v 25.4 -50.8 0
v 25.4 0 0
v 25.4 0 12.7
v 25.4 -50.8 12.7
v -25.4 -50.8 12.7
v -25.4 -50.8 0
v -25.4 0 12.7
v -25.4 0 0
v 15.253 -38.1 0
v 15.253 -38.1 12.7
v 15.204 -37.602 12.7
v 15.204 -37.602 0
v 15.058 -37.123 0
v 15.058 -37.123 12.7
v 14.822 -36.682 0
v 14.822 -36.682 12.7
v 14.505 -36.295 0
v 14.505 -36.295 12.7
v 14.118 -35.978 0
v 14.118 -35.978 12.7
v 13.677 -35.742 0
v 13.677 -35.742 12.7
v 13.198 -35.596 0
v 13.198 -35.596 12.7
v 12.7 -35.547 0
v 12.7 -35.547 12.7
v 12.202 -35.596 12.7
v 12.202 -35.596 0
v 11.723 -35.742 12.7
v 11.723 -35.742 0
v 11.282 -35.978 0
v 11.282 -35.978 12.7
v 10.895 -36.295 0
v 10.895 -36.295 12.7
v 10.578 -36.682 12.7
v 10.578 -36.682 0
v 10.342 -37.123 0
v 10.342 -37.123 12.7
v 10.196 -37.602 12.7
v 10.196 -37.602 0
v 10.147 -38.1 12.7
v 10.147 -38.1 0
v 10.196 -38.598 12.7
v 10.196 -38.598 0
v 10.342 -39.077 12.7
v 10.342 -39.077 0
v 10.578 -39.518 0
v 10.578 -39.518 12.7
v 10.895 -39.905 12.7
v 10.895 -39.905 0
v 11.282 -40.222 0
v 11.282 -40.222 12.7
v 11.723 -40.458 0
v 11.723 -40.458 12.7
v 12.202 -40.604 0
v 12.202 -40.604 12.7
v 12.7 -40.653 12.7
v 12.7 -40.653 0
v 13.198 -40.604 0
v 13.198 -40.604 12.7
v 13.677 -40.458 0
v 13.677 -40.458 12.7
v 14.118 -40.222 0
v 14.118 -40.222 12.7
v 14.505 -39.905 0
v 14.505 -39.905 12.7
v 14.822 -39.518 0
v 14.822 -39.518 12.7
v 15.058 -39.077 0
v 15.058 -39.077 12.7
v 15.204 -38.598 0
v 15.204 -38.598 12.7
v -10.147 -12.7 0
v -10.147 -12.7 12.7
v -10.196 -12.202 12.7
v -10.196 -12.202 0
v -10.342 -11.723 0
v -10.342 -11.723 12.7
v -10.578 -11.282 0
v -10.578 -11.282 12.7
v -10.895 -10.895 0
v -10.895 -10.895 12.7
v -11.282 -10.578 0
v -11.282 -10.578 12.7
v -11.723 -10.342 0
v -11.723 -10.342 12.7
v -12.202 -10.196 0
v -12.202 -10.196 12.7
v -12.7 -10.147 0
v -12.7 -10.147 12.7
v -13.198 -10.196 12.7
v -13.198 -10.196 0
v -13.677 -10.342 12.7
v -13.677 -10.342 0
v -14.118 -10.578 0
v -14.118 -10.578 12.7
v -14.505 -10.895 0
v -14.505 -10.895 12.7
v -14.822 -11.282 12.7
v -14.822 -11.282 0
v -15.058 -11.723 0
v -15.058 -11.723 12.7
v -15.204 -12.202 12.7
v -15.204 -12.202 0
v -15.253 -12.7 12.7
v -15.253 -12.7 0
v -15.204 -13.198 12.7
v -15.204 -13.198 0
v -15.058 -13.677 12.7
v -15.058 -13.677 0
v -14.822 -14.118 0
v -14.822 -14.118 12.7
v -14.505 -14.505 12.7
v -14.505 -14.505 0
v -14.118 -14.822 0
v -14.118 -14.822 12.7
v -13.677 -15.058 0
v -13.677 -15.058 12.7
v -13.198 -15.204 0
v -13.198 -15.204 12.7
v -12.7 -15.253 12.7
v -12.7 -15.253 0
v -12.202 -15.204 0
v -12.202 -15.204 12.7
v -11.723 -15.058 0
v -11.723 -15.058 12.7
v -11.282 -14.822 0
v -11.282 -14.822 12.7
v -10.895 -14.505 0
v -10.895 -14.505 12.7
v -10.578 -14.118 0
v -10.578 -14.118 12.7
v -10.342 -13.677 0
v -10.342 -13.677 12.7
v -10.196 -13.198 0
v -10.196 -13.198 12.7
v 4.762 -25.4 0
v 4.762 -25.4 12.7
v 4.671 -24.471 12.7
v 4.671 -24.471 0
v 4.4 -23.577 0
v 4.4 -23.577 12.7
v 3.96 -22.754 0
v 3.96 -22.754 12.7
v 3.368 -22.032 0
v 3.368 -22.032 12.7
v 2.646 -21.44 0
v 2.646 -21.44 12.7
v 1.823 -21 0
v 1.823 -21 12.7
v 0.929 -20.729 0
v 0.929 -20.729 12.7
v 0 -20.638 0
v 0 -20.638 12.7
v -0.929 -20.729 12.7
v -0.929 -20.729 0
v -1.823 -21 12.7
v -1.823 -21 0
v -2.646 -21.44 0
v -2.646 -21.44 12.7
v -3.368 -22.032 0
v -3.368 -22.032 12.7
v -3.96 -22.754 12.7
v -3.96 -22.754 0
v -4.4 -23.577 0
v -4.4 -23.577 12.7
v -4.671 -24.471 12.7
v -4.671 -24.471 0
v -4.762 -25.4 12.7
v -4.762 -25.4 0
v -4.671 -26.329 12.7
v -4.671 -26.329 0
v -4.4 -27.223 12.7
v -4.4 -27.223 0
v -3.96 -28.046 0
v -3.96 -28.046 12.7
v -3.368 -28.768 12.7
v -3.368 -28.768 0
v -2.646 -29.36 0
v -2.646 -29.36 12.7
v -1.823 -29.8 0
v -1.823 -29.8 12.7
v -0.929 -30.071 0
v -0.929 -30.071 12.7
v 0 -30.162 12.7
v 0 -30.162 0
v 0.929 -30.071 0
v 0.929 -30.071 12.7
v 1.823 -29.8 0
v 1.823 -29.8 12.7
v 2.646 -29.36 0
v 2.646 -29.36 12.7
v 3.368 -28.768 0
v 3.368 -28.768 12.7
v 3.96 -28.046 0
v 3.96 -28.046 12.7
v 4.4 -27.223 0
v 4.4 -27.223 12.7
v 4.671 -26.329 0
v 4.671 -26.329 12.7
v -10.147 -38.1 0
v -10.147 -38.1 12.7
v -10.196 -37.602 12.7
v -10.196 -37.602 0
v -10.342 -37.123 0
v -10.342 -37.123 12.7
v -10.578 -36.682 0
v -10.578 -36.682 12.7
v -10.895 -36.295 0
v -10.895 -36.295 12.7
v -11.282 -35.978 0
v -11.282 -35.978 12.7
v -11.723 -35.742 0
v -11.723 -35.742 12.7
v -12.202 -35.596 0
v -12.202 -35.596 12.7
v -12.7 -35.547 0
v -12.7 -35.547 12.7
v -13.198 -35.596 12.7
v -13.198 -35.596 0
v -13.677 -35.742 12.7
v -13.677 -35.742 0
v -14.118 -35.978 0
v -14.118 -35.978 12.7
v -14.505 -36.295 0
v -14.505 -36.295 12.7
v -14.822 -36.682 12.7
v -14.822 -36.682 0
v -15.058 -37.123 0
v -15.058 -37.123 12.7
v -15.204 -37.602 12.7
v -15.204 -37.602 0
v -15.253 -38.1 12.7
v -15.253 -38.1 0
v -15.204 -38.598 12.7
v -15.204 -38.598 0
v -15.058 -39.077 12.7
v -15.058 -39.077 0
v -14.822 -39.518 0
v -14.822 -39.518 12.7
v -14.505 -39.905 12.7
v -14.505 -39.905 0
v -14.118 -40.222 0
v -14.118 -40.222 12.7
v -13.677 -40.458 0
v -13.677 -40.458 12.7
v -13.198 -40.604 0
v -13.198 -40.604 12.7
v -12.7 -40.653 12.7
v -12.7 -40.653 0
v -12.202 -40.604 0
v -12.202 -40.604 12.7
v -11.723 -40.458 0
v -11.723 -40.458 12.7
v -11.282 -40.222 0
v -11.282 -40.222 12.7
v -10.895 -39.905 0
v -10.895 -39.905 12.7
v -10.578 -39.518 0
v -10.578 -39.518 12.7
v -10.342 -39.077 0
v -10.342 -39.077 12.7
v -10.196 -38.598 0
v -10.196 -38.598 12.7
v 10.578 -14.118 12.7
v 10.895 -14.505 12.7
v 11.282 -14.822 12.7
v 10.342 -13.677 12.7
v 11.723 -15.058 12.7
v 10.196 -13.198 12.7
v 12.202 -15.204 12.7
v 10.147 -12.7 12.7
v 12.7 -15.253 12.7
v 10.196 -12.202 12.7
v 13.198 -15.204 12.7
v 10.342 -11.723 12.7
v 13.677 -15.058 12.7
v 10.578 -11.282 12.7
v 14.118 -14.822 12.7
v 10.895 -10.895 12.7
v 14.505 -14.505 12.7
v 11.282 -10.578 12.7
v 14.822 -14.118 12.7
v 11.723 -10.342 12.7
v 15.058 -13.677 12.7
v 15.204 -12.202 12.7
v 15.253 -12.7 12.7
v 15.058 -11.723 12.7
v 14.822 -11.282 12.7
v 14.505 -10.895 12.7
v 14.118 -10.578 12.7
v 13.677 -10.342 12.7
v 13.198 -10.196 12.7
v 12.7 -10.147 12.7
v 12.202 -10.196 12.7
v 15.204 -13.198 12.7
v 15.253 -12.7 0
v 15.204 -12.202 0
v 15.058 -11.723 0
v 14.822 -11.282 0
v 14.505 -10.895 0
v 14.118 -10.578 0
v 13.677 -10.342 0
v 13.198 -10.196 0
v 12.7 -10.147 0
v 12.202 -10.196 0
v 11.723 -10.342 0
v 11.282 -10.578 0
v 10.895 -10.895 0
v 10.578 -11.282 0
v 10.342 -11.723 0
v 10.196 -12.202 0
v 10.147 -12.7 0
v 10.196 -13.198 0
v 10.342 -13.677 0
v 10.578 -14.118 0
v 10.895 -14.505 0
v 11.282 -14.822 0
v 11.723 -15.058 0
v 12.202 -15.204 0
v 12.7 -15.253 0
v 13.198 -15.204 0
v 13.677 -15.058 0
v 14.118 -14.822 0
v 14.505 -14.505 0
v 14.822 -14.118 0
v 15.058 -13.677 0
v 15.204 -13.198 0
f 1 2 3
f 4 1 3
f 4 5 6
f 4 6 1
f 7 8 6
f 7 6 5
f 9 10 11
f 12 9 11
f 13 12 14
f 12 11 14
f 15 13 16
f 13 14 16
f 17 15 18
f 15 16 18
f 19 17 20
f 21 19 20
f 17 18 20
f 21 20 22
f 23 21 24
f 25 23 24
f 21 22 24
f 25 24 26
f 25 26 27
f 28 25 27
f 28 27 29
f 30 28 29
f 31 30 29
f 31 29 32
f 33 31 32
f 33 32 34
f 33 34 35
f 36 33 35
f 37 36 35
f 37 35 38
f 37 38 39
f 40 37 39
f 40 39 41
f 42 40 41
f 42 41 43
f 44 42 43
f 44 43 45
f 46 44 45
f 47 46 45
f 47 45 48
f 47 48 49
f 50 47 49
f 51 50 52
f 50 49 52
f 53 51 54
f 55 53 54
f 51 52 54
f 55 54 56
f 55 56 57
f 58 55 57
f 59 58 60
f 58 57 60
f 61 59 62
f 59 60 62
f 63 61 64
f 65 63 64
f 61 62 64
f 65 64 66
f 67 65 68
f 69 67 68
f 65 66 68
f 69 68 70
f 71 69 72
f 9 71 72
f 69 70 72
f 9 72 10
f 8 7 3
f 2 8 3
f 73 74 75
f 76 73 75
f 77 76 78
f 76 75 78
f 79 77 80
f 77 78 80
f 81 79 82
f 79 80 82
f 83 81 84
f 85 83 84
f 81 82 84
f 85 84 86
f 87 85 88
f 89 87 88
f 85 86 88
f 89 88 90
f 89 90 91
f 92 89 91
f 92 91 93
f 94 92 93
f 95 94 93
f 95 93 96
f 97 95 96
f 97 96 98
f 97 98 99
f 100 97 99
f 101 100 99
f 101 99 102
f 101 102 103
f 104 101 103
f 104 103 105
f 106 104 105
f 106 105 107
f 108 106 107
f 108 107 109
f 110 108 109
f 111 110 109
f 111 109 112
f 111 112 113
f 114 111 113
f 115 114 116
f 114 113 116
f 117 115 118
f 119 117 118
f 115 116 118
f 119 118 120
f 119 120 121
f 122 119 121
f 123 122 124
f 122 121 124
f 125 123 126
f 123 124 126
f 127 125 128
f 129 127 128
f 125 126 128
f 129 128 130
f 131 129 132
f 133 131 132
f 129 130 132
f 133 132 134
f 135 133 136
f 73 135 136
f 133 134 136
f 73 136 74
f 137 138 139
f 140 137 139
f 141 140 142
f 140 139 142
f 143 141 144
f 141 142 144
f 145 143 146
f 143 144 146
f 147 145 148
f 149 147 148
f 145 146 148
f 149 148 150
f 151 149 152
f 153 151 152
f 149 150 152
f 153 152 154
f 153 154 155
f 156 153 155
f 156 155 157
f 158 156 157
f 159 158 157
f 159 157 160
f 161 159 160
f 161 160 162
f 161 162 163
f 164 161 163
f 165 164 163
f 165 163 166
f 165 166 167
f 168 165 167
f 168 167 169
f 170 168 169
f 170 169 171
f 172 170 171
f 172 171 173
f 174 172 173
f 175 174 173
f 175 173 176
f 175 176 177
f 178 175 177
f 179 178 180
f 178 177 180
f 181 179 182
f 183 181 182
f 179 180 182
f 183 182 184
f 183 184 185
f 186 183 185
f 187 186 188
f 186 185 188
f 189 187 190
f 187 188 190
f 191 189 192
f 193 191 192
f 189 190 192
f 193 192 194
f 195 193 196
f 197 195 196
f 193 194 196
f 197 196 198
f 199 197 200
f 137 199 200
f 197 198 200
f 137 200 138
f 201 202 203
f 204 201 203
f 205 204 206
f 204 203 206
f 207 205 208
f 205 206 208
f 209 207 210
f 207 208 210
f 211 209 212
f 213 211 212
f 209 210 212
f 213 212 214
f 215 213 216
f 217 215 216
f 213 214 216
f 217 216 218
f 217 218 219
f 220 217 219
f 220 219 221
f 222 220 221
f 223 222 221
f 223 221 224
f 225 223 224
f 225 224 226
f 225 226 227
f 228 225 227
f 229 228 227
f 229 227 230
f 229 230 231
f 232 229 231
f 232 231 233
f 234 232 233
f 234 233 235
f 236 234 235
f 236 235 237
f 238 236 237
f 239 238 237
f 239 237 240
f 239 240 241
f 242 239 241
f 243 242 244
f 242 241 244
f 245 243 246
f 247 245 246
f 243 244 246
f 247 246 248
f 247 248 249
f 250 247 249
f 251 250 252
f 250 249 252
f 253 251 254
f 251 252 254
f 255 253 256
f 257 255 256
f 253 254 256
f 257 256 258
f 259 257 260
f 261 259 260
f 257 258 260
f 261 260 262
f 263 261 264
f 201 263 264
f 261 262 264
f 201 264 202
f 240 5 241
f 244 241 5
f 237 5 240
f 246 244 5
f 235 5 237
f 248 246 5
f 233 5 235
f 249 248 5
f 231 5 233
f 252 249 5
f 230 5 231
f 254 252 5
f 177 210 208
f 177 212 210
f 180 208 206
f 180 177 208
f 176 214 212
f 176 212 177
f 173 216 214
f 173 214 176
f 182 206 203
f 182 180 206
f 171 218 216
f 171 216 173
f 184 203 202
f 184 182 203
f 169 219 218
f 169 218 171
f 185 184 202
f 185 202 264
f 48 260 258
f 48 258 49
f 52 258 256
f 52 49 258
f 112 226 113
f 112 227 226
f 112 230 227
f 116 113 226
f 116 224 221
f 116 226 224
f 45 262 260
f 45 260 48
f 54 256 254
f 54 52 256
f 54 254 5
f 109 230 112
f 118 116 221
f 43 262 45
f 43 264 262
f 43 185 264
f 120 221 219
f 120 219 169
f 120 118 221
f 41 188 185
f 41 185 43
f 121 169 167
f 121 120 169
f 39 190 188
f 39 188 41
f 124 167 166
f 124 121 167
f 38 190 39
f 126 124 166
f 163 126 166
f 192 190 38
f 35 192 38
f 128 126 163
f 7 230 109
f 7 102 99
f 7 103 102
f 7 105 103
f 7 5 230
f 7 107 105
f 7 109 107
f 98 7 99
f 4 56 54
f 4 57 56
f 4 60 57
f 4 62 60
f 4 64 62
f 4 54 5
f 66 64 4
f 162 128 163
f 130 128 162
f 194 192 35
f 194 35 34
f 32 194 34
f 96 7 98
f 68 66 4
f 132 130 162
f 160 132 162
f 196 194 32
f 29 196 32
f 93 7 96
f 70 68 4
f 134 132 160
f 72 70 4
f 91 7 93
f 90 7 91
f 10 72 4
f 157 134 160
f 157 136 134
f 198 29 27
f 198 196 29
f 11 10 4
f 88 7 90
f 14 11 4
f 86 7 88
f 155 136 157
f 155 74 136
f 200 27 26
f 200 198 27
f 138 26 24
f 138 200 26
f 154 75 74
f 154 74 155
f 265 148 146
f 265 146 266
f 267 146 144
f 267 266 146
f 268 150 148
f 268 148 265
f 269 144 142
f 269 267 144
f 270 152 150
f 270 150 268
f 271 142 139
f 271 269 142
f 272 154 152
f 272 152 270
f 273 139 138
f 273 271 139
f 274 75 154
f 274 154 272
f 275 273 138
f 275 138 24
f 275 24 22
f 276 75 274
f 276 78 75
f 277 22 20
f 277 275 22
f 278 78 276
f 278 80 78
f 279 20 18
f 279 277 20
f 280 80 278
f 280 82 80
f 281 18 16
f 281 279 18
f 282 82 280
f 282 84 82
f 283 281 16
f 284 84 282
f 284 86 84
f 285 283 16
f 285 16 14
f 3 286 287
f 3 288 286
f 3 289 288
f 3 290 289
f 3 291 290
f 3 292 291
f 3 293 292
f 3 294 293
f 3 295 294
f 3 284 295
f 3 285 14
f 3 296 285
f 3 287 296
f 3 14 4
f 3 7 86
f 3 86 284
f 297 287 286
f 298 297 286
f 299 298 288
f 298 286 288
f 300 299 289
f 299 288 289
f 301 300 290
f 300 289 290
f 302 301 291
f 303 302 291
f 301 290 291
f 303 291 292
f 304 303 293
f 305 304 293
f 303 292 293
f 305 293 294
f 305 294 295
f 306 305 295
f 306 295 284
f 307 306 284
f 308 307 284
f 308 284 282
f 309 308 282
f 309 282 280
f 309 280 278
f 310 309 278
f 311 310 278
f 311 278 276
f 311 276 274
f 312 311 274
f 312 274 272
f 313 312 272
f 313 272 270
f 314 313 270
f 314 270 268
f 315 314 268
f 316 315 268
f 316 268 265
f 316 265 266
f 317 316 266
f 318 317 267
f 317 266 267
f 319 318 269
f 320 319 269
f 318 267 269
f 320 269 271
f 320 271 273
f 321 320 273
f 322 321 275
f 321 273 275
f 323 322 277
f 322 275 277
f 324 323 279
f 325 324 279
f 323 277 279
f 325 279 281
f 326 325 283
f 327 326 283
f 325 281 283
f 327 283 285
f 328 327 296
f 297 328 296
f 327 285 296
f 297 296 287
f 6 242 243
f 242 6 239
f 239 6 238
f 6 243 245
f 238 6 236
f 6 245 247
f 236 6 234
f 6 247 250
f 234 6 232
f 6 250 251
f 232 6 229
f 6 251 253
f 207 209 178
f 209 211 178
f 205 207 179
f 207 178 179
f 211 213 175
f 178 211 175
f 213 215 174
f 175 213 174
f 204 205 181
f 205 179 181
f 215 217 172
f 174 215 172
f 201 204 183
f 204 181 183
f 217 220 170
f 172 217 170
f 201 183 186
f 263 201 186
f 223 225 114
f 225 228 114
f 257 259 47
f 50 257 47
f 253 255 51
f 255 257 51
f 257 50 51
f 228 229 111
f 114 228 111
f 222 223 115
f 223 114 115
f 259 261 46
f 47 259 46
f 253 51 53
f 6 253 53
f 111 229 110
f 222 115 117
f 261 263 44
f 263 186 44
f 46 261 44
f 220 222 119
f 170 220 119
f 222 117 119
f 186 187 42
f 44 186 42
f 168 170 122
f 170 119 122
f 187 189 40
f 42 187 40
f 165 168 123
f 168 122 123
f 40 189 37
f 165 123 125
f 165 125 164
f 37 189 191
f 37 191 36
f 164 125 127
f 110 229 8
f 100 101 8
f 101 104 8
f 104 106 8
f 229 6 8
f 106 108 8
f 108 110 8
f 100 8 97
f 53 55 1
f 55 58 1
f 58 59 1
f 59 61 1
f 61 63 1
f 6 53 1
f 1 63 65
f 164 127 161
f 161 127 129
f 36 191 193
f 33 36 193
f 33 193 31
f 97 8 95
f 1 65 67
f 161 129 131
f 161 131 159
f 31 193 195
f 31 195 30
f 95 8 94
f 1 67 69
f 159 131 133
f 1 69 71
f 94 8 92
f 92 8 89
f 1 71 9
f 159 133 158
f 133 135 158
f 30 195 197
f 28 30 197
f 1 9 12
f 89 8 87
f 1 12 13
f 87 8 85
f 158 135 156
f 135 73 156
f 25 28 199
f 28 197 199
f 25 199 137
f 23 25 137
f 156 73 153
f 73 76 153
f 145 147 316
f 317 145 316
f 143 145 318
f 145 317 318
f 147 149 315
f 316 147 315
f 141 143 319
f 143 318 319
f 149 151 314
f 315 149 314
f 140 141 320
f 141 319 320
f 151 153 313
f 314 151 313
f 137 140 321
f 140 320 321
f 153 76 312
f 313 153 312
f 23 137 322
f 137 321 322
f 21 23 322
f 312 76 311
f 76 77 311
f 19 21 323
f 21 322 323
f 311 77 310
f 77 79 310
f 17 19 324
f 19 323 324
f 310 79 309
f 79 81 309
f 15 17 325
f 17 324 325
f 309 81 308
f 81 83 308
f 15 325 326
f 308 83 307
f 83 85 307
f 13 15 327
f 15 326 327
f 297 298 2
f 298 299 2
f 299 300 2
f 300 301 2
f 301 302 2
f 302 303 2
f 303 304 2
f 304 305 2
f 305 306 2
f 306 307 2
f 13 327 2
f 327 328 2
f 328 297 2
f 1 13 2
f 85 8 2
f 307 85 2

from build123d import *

# Parameters (mm, degrees)
F0_W          = 50.8
F0_H          = 12.7
F1_DEPTH      = 50.8
F2_R          = 2.5527
F2_R_2        = 4.7625
F3_DEPTH      = 12.701
F4_W          = 50.8
F4_H          = 50.8
F4_R          = 4.7625
F4_R_2        = 9.525
F5_DEPTH      = 12.7
F6_W          = 50.8
F6_H          = 50.8
F6_R          = 4.7625
F6_R_2        = 3.175
F7_DEPTH      = 6.35
F8_R          = 2.8575
F9_DEPTH      = 38.1
F9_DEPTH_BACK = 15.875
F10_R         = 19.05
F11_DEPTH     = 9.525
F12_R         = 2.8575
F13_DEPTH     = 1.5875


with BuildPart() as f1:
    # F0 (on Front) → F1 (new body)
    with BuildSketch(Plane.XZ):
        with Locations((0, 6.35)):
            Rectangle(F0_W, F0_H)
    extrude(amount=F1_DEPTH)

    # F2 (on face) → F3 (cut, through all)
    with BuildSketch(Plane.XY.offset(12.7)):
        with Locations((-12.7, -12.7)):
            Circle(F2_R)
        with Locations((-12.7, -38.1)):
            Circle(F2_R)
        with Locations((12.7, -38.1)):
            Circle(F2_R)
        with Locations((12.7, -12.7)):
            Circle(F2_R)
        with Locations((0, -25.4)):
            Circle(F2_R_2)
    extrude(amount=-F3_DEPTH, mode=Mode.SUBTRACT)


with BuildPart() as f5:
    # F4 (on face) → F5 (new body)
    with BuildSketch(Plane.XY.offset(12.7)):
        with Locations((0, -25.4)):
            Rectangle(F4_W, F4_H)
        with Locations((-12.7, -38.1)):
            Circle(F4_R, mode=Mode.SUBTRACT)
        with Locations((0, -25.4)):
            Circle(F4_R_2, mode=Mode.SUBTRACT)
        with Locations((12.7, -38.1)):
            Circle(F4_R, mode=Mode.SUBTRACT)
        with Locations((-12.7, -12.7)):
            Circle(F4_R, mode=Mode.SUBTRACT)
        with Locations((12.7, -12.7)):
            Circle(F4_R, mode=Mode.SUBTRACT)
    extrude(amount=F5_DEPTH)

    # F6 (on face) → F7 (join)
    with BuildSketch(Plane.XY.offset(25.4)):
        with Locations((0, -25.4)):
            Rectangle(F6_W, F6_H)
        with Locations((-12.7, -38.1)):
            Circle(F6_R, mode=Mode.SUBTRACT)
        with Locations((0, -25.4)):
            Circle(F6_R_2, mode=Mode.SUBTRACT)
        with Locations((12.7, -38.1)):
            Circle(F6_R, mode=Mode.SUBTRACT)
        with Locations((-12.7, -12.7)):
            Circle(F6_R, mode=Mode.SUBTRACT)
        with Locations((12.7, -12.7)):
            Circle(F6_R, mode=Mode.SUBTRACT)
    extrude(amount=F7_DEPTH)


with BuildPart() as f9:
    # F8 (on face) → F9 (new body, two sides)
    with BuildSketch(Plane.XY.offset(31.75)) as f9_sk:
        with Locations((0, -25.4)):
            Circle(F8_R)
    extrude(amount=-F9_DEPTH)
    extrude(f9_sk.sketch, amount=-F9_DEPTH_BACK)

    # F10 (on face) → F11 (join)
    with BuildSketch(Plane.XY.offset(47.625)):
        with Locations((0, -25.4)):
            Circle(F10_R)
    extrude(amount=F11_DEPTH)


with BuildPart() as f13:
    # F12 (on face) → F13 (new body)
    with BuildSketch(Plane.XY.offset(12.7)):
        Polygon((4.7625, -28.149631), (4.7625, -22.650369), (0, -19.900739), (-4.7625, -22.650369), (-4.7625, -28.149631), (0, -30.899261), align=None)
        with Locations((0, -25.4)):
            Circle(F12_R, mode=Mode.SUBTRACT)
    extrude(amount=F13_DEPTH)


solid = f1.part
